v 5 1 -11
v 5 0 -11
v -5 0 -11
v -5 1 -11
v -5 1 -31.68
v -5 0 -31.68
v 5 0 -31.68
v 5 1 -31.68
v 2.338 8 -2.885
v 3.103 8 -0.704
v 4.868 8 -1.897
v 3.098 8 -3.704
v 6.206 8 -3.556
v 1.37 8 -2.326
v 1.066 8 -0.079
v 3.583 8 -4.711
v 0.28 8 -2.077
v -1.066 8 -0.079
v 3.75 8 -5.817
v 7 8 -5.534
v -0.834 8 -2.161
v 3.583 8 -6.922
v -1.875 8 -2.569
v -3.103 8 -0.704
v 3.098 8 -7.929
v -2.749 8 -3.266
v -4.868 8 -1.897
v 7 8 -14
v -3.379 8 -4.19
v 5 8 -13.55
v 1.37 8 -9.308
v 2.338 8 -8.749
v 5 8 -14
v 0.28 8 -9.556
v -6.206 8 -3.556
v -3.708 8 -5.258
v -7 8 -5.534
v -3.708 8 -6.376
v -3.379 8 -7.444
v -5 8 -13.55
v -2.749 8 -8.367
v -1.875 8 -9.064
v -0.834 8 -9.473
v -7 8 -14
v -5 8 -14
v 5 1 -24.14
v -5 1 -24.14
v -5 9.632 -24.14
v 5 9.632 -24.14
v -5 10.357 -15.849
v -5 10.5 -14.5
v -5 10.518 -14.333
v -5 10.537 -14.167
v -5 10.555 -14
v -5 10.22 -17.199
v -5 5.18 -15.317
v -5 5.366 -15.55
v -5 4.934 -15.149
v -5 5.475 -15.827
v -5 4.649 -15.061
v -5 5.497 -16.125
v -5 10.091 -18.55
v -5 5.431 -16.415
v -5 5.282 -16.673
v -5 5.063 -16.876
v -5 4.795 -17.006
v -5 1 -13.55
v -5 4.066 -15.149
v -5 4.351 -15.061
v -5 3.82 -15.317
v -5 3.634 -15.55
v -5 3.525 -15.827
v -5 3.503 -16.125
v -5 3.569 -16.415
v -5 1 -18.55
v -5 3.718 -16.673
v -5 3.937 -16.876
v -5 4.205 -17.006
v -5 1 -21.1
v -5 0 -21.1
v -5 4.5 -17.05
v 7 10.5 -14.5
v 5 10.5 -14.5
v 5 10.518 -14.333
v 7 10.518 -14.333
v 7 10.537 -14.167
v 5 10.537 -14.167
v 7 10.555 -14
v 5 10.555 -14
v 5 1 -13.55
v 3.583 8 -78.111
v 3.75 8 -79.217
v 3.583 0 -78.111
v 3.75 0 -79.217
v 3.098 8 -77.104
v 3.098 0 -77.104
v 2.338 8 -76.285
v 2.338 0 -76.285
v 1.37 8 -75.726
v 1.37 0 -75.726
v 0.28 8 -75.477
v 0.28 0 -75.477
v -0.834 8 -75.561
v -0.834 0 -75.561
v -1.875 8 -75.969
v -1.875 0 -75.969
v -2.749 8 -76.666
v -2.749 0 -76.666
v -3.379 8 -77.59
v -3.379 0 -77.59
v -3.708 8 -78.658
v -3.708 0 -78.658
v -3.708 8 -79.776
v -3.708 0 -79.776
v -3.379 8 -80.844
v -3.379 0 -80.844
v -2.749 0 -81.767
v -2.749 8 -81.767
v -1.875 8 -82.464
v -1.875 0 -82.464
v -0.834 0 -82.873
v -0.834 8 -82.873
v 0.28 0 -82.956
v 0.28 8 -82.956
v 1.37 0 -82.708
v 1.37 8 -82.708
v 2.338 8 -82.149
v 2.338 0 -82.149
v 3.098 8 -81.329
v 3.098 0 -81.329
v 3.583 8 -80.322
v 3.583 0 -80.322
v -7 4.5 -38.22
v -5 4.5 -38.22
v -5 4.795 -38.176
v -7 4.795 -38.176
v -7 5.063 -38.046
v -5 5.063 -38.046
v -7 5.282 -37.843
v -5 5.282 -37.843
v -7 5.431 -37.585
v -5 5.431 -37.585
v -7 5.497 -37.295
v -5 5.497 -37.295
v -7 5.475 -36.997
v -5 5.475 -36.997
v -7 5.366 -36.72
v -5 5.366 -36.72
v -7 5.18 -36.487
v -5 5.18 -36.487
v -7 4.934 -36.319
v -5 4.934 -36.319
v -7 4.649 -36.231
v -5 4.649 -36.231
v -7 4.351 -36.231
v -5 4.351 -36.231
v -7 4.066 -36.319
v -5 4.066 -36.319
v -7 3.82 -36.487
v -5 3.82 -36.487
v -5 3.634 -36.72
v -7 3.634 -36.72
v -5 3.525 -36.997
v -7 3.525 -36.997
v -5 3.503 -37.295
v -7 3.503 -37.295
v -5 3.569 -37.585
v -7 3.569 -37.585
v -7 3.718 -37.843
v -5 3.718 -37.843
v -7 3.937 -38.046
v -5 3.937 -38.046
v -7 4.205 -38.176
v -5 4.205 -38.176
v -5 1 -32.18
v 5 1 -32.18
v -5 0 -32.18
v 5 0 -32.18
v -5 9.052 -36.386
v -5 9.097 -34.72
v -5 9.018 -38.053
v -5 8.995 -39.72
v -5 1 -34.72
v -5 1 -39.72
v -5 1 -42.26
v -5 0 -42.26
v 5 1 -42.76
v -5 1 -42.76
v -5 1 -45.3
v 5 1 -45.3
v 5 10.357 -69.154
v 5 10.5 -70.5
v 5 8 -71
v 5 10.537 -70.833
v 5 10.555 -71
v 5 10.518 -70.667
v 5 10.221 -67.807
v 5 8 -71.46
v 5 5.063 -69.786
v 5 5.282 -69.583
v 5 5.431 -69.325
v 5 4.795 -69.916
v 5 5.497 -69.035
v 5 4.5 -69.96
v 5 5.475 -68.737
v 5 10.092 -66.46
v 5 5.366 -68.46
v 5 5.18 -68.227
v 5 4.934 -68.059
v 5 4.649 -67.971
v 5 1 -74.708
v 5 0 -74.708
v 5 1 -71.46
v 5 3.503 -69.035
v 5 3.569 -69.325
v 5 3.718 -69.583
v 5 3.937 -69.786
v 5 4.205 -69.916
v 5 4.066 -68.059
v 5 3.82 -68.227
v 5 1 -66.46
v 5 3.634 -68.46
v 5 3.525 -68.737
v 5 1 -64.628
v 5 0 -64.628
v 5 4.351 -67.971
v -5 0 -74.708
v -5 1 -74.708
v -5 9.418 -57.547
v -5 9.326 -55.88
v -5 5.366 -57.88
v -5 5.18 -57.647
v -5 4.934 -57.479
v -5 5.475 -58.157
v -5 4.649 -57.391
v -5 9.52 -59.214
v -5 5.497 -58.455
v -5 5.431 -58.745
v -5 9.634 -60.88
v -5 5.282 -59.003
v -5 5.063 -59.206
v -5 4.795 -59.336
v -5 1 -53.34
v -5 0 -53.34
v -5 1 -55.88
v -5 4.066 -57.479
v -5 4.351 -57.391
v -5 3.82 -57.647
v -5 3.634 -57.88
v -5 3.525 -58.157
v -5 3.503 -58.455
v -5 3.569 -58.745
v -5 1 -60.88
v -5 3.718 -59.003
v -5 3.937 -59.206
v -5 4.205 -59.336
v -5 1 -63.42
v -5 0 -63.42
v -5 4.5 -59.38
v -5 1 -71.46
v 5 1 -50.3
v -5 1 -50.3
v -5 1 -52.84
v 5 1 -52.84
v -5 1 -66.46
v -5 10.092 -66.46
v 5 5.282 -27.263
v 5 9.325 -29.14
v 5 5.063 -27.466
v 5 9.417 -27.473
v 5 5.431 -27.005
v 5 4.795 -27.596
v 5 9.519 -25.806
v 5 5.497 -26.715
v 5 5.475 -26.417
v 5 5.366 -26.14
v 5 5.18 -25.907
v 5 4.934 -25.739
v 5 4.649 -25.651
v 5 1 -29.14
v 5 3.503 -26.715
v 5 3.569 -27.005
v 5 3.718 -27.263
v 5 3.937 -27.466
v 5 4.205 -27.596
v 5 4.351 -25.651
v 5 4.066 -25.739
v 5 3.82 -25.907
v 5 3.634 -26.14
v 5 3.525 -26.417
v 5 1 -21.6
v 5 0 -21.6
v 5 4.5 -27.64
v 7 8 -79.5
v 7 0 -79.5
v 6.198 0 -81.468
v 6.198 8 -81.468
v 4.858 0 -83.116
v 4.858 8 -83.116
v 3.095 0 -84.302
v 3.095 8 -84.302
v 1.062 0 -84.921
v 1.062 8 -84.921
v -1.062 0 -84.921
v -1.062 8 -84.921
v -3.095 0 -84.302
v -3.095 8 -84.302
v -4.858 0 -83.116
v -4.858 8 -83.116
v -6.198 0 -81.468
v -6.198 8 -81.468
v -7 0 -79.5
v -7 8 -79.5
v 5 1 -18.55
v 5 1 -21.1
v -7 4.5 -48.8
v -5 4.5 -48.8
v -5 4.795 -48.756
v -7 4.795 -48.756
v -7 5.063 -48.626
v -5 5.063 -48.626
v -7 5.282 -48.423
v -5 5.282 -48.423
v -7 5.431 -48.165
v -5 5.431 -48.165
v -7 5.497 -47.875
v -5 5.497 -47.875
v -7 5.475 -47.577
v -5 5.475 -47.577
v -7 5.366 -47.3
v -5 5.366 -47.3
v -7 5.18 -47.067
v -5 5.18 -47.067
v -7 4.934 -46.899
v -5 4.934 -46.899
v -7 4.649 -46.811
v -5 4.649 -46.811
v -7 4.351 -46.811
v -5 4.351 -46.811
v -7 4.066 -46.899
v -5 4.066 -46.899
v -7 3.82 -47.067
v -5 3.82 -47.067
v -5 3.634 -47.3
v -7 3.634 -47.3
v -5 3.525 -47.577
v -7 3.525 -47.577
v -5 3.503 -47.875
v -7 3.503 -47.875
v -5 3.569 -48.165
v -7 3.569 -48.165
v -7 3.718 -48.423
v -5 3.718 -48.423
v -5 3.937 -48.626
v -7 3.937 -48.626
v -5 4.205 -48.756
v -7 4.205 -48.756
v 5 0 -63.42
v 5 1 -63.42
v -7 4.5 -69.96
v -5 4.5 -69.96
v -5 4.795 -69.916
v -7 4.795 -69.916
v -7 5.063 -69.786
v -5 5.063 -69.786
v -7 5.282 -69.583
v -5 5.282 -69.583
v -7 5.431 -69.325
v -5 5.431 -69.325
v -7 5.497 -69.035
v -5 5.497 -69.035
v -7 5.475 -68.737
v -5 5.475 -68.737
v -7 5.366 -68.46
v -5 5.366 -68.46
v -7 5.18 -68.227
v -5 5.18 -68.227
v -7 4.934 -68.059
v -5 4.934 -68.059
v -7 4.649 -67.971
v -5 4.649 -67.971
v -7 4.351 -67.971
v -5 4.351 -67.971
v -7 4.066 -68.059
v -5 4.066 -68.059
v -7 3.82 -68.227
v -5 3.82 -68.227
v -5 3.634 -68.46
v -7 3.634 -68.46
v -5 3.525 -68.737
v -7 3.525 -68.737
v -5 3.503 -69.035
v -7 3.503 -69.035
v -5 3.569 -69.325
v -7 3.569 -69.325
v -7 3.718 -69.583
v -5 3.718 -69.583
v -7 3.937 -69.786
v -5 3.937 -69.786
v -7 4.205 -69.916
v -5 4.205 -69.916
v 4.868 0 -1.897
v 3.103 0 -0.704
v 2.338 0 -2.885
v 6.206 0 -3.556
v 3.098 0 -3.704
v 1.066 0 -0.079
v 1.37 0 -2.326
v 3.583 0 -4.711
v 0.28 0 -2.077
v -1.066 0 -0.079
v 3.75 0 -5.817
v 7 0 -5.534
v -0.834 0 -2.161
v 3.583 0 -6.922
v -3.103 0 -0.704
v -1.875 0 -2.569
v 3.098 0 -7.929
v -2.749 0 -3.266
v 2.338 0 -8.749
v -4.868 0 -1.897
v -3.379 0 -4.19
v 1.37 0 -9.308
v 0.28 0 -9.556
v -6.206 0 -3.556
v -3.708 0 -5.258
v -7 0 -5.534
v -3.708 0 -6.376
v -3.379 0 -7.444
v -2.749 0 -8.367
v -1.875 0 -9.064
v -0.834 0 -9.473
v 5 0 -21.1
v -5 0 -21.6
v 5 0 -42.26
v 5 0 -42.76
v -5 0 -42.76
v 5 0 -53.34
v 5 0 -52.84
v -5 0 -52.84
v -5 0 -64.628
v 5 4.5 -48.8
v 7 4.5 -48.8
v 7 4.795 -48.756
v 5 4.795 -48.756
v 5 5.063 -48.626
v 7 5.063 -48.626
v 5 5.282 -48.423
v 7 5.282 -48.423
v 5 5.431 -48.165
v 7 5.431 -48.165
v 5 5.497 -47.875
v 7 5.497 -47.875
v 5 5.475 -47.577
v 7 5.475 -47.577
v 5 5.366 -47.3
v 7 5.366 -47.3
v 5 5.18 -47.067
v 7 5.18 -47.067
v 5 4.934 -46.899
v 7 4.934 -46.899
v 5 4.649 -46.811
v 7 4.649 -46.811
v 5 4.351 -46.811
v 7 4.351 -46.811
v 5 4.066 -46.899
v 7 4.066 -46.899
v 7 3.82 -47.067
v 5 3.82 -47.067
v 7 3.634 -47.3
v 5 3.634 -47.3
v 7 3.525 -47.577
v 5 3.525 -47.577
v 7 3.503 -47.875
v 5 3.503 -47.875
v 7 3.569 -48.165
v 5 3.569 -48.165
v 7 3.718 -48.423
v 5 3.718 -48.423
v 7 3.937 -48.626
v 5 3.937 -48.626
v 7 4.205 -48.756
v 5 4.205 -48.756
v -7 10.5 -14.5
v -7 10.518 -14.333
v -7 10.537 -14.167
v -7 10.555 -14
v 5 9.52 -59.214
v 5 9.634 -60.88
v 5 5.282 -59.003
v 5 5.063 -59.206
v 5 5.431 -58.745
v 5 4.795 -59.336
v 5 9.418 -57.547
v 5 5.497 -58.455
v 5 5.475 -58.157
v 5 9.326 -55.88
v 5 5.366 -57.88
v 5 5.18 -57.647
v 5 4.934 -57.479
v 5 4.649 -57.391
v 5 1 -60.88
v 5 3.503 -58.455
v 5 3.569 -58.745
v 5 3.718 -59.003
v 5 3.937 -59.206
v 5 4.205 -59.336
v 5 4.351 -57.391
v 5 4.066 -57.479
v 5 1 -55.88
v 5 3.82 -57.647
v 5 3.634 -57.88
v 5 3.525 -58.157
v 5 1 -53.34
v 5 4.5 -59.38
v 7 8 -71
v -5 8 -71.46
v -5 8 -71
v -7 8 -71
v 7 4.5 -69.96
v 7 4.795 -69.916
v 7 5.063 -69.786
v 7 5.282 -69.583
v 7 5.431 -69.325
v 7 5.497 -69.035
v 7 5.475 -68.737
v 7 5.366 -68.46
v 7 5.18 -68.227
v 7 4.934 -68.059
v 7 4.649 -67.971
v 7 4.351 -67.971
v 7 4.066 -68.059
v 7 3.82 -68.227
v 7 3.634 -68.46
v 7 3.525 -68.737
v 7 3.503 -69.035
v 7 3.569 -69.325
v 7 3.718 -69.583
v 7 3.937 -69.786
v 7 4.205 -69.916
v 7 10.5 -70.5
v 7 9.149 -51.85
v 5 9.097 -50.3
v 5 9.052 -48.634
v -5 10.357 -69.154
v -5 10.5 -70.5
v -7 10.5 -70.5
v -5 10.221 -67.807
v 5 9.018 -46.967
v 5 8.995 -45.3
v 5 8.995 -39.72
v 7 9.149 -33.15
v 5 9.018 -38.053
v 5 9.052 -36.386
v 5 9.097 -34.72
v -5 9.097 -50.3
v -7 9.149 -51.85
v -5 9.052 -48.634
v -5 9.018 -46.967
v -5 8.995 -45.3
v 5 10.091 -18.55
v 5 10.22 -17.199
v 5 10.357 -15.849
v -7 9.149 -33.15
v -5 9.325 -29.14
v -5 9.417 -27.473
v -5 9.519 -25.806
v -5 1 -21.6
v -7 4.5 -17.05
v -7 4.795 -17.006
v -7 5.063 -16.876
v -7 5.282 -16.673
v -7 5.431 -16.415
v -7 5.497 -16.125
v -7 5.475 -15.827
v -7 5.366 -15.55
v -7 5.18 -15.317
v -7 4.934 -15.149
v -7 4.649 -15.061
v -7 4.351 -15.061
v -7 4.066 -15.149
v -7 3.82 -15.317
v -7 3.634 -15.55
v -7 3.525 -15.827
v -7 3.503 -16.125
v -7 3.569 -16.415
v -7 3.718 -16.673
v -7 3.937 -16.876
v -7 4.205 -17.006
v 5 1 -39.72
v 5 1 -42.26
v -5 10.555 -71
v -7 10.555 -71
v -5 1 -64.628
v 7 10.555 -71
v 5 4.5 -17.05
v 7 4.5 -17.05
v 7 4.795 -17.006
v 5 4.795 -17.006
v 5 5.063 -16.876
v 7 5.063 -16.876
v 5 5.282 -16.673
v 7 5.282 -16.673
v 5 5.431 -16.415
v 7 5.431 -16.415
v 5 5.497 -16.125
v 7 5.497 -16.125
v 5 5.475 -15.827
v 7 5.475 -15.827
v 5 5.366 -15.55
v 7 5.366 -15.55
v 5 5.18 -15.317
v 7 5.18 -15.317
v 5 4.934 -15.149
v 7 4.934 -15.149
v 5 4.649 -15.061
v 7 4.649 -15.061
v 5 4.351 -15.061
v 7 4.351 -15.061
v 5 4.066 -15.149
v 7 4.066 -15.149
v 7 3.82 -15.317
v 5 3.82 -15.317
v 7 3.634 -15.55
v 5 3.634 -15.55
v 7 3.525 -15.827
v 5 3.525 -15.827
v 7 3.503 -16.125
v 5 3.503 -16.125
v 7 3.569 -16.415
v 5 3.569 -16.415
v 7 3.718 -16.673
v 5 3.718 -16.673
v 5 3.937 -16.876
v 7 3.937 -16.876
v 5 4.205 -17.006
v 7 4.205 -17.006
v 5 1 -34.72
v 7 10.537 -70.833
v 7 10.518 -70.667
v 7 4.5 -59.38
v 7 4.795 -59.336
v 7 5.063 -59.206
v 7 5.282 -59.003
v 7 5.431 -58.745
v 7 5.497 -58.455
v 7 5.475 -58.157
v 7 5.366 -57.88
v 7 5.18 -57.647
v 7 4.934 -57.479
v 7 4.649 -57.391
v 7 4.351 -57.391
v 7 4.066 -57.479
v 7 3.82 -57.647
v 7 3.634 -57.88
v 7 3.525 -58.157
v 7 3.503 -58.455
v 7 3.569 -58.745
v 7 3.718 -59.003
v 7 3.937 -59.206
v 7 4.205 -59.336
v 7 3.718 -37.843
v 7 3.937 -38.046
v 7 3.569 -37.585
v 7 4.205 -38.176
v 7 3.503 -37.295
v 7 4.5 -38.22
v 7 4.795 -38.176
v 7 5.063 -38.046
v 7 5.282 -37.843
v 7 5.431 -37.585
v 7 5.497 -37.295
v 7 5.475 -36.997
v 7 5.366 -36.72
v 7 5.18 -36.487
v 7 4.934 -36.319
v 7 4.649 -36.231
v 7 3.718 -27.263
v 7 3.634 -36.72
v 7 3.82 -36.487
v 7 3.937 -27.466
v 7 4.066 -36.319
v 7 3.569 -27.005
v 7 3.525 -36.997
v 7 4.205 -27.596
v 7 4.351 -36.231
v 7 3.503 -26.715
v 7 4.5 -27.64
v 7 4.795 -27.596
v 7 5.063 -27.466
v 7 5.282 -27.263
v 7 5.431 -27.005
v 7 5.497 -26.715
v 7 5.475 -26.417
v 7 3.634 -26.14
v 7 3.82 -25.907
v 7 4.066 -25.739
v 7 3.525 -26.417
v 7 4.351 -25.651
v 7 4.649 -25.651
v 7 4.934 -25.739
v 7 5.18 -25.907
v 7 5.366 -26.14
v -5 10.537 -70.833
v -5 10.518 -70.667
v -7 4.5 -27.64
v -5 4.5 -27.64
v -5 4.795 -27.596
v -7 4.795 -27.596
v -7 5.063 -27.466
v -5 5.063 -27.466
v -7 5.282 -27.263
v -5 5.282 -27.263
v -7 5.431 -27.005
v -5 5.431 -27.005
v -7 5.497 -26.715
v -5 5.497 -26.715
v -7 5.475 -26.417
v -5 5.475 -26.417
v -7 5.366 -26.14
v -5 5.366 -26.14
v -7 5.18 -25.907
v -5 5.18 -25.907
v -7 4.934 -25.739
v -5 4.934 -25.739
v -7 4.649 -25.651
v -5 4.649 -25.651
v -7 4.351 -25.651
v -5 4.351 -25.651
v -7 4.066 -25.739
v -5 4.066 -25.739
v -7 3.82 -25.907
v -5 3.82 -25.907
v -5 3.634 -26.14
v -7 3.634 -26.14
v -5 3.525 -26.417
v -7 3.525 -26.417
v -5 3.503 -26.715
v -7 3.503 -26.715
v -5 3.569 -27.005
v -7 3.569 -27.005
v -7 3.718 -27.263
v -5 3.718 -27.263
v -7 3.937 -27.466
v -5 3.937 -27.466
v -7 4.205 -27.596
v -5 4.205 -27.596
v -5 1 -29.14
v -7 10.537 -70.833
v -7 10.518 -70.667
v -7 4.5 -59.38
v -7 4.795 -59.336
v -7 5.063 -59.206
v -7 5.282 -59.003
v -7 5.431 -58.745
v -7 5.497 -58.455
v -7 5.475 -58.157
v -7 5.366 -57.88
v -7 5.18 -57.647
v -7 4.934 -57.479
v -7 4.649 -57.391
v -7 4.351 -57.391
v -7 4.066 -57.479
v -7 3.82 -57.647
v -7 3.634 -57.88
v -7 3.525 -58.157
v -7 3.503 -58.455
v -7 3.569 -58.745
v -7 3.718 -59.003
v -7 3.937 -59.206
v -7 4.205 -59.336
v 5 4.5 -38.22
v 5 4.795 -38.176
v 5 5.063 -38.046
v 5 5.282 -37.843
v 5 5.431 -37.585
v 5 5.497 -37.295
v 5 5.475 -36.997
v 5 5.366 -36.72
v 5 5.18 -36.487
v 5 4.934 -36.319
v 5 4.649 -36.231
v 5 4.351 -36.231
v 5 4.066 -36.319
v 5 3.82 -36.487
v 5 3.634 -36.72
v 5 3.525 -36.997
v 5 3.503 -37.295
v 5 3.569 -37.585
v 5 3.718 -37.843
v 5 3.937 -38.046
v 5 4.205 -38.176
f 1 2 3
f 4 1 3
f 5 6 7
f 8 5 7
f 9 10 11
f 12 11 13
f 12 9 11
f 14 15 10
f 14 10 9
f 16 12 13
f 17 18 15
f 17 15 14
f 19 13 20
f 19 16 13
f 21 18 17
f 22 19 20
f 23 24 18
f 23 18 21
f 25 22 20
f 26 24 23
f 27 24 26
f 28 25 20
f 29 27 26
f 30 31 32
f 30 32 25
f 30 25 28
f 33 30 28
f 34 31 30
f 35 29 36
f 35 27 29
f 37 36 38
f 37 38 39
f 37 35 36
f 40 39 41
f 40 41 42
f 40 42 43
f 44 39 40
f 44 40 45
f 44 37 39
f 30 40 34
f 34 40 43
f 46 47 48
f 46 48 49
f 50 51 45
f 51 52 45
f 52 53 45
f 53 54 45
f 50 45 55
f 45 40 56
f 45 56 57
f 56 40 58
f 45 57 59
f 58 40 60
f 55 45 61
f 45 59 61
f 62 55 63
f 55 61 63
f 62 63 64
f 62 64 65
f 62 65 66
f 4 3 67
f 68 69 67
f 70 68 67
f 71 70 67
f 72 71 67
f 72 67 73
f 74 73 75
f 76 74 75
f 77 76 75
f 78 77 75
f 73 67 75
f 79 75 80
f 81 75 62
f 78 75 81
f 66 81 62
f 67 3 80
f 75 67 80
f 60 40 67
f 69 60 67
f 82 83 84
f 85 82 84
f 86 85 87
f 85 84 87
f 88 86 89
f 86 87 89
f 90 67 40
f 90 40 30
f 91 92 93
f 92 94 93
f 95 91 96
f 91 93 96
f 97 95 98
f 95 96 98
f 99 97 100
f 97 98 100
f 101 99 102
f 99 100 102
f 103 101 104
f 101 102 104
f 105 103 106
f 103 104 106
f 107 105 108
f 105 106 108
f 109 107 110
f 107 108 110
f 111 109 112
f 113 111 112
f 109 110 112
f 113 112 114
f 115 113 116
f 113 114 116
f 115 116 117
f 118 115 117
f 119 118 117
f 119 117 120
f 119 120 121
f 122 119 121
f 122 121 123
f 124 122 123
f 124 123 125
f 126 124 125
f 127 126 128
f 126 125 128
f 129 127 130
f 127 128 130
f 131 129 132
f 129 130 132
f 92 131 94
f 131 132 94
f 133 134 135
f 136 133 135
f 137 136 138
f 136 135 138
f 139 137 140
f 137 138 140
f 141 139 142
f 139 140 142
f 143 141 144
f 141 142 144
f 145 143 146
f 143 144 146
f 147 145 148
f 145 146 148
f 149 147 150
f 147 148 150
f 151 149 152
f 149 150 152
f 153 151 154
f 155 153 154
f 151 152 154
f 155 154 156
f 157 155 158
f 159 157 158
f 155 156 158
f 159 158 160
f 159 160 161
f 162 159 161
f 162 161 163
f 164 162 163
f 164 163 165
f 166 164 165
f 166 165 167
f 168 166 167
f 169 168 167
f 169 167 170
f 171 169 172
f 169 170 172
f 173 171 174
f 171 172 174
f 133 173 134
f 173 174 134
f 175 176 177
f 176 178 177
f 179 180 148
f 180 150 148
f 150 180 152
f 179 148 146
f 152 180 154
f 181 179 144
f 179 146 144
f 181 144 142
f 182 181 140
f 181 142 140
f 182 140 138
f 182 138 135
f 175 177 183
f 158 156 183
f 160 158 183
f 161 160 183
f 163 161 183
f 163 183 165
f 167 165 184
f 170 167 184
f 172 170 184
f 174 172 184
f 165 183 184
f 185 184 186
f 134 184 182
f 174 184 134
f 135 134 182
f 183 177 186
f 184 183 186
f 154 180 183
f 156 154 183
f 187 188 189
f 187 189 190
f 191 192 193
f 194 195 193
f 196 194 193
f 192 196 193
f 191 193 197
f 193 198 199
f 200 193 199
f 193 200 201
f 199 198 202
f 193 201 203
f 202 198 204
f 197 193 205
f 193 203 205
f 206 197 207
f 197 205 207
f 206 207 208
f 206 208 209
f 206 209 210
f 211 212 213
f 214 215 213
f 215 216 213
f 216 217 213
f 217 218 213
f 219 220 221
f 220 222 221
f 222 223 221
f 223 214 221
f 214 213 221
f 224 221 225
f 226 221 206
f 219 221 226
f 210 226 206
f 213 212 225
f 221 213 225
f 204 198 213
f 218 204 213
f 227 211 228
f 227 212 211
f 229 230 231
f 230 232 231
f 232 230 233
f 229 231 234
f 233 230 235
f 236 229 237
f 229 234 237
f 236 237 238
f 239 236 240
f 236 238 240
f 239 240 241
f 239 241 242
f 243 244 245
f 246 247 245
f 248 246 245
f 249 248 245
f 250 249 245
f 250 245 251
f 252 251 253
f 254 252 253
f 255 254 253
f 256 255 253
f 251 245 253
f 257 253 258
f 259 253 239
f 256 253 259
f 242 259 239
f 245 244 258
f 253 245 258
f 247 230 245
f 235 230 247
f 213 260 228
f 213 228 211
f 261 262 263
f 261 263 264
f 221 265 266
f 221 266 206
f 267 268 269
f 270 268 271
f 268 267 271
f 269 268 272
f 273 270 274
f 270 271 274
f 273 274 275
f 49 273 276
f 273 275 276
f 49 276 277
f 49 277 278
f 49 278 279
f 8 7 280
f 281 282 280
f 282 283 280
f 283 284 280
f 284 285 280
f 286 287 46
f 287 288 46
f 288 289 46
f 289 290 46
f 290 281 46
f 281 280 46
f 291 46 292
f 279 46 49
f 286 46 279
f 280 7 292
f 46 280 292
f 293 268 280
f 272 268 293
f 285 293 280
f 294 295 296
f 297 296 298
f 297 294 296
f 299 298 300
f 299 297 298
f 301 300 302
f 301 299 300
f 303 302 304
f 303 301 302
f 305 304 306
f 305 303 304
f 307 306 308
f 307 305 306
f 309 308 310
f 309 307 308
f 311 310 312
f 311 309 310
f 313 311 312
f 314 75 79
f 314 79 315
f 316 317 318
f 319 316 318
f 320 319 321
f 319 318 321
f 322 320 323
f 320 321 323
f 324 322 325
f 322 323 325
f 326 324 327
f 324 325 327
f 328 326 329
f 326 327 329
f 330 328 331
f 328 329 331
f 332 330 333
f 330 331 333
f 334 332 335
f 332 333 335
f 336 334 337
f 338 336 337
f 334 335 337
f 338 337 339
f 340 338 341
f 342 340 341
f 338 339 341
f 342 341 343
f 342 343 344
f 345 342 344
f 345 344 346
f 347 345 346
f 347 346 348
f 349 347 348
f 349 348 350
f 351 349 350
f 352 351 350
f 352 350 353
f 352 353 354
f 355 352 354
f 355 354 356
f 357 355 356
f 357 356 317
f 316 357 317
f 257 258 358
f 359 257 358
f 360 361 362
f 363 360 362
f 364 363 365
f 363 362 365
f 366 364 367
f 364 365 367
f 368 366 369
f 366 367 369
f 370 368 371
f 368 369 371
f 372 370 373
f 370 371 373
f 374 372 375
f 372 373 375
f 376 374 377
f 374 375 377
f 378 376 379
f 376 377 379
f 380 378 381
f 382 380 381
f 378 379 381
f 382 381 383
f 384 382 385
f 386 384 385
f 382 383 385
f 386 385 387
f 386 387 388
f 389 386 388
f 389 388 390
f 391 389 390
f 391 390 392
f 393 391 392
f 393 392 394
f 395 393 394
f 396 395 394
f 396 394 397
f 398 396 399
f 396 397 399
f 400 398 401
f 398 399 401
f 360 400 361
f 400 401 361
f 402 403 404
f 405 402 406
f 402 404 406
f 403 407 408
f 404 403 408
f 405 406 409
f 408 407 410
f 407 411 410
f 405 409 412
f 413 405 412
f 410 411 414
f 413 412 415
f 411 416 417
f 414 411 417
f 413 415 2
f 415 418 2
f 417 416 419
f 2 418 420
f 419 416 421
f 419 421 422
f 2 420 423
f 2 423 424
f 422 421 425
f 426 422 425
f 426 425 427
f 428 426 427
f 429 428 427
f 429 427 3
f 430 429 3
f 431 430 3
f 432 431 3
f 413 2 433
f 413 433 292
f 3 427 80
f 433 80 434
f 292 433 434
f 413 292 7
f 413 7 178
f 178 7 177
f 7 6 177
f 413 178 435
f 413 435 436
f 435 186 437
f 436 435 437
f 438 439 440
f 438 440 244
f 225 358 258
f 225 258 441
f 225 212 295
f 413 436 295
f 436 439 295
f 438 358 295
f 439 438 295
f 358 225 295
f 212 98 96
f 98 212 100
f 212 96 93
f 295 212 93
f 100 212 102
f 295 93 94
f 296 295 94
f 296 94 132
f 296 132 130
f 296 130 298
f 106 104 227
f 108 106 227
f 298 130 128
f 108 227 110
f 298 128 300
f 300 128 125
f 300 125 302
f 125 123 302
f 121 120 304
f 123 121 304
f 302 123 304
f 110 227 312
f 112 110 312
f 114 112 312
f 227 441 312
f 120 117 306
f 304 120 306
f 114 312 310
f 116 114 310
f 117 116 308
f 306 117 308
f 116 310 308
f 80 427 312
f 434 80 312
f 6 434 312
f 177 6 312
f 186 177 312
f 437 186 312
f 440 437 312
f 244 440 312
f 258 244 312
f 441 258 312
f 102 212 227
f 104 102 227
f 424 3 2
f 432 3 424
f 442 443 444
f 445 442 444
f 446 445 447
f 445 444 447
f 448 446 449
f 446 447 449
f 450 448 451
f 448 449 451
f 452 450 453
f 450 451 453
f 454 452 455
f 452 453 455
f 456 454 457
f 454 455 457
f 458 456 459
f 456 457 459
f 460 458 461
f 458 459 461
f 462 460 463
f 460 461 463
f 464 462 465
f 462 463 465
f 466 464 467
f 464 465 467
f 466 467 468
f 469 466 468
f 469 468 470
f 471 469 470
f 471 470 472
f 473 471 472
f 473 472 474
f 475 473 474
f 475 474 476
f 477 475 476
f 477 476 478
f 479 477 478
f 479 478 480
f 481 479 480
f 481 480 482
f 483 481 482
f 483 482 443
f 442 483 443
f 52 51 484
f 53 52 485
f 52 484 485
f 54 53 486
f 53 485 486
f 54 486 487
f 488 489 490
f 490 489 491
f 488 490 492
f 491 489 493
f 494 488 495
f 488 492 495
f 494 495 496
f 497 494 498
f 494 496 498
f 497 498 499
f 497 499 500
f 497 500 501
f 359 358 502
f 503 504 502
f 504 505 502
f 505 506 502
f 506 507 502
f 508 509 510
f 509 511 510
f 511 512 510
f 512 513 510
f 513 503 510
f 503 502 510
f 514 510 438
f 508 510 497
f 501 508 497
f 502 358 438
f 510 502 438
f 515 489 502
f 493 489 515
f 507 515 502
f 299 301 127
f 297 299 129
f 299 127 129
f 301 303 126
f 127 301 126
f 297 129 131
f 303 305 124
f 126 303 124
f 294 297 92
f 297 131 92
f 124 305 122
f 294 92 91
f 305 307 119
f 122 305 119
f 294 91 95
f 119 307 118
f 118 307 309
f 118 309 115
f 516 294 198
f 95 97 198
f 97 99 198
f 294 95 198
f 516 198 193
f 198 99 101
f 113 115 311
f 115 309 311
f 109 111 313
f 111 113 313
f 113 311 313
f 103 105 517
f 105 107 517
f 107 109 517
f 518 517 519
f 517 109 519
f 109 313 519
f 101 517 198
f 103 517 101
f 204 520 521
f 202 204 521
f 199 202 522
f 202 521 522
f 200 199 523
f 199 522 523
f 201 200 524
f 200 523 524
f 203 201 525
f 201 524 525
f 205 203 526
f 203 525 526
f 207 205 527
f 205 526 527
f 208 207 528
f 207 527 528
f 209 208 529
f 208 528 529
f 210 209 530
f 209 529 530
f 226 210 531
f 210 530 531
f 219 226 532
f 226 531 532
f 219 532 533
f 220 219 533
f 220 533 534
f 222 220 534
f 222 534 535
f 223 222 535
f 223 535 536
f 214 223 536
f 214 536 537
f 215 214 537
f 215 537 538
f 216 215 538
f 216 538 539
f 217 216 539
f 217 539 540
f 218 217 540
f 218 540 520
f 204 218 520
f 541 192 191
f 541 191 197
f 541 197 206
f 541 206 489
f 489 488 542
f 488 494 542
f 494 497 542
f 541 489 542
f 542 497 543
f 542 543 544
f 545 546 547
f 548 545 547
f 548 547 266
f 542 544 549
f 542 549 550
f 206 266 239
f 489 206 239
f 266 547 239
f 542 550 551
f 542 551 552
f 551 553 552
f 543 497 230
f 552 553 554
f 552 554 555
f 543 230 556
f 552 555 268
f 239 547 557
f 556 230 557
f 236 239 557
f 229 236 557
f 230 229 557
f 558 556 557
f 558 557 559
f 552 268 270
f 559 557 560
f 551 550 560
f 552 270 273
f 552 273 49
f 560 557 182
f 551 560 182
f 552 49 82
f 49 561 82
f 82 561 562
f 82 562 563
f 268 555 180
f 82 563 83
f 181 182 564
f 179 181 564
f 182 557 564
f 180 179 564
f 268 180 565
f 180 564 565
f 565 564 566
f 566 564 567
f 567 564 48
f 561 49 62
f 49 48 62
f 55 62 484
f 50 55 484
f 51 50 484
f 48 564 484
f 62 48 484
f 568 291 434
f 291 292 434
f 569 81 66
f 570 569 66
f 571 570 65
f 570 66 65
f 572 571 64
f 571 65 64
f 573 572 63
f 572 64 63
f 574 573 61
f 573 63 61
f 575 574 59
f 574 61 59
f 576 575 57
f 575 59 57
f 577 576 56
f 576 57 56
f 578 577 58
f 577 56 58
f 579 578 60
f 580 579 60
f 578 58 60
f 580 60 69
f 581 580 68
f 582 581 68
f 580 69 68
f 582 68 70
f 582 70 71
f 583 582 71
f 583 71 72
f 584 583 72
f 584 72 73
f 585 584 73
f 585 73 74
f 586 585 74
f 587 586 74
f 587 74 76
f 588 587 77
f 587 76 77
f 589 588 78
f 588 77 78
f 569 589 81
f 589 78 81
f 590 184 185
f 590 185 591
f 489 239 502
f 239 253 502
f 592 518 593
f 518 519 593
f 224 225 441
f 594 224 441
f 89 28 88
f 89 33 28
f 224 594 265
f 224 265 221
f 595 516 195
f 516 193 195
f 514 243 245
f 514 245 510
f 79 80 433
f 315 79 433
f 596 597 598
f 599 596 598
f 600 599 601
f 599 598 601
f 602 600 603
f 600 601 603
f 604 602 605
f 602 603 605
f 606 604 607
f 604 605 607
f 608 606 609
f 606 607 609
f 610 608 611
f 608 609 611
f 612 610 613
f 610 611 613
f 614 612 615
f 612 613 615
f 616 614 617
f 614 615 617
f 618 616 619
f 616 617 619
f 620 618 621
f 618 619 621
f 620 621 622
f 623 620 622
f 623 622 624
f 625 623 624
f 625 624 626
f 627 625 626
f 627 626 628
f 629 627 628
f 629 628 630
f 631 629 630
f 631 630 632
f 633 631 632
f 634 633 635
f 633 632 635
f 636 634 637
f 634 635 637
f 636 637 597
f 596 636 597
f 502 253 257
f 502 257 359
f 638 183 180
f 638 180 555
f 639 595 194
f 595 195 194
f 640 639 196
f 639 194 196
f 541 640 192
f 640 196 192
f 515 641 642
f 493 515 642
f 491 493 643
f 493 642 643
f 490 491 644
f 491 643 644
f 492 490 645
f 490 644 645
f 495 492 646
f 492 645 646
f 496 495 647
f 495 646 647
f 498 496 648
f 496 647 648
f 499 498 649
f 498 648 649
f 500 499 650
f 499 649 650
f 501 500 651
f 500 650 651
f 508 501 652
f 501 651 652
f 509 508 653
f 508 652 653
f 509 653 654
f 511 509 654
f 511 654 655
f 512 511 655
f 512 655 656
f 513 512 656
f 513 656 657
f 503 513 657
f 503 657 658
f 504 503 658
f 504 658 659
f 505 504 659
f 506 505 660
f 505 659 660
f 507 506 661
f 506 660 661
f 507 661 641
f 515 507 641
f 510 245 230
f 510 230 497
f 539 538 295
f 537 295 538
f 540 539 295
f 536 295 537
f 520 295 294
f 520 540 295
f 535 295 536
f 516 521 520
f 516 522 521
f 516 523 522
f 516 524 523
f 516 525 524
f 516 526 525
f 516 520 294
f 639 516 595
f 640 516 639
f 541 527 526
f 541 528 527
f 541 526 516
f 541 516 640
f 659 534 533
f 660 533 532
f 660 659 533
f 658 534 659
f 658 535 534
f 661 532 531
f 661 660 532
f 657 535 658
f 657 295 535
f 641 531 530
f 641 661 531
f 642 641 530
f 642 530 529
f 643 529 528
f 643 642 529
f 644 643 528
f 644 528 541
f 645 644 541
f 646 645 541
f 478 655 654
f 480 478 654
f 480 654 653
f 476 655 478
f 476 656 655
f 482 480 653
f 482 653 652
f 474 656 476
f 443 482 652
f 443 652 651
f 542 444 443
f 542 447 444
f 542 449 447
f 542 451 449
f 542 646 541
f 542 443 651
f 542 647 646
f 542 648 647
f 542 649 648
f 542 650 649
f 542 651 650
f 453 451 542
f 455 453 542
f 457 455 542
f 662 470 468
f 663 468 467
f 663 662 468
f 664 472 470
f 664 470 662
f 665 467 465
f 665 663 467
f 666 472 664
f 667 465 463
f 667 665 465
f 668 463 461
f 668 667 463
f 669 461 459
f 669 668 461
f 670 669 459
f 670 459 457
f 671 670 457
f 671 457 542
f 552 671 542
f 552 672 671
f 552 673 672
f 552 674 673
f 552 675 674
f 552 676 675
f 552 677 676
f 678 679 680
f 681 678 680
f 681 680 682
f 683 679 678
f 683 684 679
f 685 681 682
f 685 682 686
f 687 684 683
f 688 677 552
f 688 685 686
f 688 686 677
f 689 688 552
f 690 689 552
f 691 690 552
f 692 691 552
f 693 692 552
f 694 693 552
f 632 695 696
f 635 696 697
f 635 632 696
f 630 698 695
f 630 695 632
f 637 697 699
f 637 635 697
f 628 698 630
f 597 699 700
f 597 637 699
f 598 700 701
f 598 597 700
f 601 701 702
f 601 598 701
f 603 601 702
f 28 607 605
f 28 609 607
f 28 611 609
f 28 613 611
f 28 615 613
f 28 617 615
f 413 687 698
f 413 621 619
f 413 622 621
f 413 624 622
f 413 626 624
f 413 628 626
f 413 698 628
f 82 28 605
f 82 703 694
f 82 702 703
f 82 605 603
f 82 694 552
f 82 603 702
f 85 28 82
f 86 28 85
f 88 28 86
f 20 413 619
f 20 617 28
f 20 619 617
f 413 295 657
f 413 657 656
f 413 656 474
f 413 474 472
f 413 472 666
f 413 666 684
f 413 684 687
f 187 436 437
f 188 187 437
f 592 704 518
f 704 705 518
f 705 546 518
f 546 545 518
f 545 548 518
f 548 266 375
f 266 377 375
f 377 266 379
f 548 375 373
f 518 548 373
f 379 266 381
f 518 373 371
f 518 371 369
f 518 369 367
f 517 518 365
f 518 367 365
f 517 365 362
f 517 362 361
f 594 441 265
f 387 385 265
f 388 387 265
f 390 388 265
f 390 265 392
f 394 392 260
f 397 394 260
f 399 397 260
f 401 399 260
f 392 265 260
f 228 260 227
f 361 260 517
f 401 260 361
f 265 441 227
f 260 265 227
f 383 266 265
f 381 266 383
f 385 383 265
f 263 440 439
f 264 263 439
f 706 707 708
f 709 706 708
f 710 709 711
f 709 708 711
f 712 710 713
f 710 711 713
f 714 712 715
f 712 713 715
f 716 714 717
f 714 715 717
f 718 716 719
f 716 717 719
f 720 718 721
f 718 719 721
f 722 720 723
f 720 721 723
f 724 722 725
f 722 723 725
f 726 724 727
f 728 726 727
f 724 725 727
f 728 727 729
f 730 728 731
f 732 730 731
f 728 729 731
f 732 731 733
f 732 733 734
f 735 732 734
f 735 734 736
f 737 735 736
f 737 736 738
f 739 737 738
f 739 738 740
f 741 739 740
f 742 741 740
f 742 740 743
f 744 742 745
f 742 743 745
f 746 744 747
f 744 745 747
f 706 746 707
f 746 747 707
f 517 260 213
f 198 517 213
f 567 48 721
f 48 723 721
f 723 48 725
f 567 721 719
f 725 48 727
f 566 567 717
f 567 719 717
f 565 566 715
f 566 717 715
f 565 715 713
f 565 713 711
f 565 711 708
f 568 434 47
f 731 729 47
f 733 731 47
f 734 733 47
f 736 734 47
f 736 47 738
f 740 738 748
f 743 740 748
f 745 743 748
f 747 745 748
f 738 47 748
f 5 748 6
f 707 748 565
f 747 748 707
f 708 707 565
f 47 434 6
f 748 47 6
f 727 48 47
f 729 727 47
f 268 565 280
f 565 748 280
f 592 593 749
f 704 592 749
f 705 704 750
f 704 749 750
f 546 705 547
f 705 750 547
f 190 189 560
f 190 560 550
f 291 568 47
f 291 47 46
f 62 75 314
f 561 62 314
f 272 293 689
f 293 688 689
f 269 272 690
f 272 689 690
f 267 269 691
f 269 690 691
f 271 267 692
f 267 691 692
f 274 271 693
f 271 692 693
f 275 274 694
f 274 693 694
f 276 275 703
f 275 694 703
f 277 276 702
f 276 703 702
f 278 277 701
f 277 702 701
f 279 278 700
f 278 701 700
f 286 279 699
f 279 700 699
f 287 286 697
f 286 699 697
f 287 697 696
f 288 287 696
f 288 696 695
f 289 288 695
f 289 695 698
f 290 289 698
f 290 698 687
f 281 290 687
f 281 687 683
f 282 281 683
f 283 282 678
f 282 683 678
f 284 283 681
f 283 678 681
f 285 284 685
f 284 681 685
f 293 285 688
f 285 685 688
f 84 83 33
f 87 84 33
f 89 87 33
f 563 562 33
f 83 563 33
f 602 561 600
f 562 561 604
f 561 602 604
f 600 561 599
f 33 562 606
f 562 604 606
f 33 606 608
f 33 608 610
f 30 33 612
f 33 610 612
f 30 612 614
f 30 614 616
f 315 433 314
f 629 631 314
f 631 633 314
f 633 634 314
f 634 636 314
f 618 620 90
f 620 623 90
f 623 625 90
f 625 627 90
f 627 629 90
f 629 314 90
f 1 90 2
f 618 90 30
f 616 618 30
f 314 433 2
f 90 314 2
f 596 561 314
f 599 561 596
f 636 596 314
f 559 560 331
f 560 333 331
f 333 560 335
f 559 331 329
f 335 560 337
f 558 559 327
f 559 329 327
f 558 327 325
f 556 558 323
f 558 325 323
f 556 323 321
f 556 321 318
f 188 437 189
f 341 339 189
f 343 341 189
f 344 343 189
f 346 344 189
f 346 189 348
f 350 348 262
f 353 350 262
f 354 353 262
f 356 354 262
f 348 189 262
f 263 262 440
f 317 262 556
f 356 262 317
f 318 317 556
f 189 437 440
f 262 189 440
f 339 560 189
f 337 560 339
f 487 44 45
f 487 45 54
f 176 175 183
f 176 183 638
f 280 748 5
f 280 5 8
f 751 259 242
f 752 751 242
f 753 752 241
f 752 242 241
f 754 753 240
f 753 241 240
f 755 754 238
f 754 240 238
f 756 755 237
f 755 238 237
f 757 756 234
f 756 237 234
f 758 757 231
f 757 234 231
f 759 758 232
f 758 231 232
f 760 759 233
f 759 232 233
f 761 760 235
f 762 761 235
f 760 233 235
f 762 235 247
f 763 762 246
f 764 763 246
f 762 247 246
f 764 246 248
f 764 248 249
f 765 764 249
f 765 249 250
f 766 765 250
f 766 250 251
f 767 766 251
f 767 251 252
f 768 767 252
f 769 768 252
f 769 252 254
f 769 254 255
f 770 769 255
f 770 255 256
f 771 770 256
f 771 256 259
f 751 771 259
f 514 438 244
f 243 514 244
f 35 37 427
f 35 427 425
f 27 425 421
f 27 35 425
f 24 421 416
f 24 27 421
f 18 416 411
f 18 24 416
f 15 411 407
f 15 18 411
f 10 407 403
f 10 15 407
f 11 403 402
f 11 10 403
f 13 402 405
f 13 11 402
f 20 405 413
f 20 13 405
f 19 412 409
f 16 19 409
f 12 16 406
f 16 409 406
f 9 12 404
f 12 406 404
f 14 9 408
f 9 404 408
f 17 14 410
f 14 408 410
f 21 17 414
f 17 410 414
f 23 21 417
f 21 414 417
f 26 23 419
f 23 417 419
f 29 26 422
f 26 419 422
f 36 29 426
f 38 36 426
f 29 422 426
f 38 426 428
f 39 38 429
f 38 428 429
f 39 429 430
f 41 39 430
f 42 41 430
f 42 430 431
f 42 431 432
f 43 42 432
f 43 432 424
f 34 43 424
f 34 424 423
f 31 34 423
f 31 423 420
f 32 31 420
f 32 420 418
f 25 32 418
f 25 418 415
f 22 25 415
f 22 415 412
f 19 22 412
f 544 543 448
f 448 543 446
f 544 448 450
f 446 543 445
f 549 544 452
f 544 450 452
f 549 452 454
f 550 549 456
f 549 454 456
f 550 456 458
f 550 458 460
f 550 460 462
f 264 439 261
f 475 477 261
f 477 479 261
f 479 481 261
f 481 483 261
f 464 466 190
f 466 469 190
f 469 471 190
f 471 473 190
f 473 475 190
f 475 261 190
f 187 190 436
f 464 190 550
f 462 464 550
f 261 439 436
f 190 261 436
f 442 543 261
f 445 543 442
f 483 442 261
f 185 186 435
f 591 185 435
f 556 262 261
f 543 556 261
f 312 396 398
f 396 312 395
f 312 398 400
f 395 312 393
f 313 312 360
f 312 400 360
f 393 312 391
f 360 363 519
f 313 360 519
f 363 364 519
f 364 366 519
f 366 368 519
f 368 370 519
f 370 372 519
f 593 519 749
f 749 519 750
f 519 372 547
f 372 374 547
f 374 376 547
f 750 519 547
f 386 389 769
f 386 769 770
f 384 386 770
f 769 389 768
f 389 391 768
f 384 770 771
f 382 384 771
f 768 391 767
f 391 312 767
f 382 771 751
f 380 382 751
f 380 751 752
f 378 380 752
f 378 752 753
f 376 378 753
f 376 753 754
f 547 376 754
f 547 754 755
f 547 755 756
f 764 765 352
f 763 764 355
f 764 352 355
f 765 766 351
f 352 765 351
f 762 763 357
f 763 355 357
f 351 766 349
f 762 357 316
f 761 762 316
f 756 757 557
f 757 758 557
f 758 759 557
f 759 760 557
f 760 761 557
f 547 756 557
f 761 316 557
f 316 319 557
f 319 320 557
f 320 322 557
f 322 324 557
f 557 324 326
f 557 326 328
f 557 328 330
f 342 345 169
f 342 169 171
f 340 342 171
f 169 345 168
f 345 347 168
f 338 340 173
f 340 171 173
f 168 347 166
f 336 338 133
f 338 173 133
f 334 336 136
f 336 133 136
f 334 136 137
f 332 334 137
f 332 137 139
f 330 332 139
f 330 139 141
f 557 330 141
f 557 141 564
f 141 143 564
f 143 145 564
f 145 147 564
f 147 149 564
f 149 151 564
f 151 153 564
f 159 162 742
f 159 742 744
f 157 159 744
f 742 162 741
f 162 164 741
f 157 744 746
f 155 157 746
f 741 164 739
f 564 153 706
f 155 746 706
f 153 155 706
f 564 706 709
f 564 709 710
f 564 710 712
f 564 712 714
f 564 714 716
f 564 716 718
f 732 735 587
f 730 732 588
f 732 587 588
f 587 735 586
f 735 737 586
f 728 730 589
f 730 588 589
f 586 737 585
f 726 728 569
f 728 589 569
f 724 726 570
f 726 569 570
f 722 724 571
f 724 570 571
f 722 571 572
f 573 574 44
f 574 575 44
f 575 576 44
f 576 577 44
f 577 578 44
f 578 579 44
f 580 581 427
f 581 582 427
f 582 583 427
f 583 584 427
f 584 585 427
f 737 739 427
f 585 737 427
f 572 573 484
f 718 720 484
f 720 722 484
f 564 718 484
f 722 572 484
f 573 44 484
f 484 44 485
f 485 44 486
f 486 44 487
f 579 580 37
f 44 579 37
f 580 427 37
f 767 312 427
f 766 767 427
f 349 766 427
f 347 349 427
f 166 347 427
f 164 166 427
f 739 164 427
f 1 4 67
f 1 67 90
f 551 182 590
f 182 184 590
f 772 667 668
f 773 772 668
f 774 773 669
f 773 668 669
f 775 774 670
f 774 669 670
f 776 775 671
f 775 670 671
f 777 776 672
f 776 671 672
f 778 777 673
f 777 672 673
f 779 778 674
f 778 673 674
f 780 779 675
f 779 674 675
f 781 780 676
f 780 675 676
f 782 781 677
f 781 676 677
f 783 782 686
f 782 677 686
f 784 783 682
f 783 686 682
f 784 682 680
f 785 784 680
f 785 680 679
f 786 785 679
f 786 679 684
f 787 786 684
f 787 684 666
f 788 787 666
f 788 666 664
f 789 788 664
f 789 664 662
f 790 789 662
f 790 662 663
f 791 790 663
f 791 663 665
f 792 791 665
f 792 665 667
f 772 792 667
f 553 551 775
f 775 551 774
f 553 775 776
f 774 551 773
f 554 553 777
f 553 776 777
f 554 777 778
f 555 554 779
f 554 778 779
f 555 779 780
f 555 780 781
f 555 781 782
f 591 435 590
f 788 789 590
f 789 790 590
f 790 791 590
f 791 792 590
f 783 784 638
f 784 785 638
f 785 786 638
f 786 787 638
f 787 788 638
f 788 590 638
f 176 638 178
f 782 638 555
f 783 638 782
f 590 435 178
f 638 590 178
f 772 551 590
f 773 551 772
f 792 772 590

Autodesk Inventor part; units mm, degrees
ref_plane "YZ Plane" through (0, 0, 0) normal (1, 0, 0) x (0, 1, 0)
ref_plane "XY Plane" through (0, 0, 0) normal (0, 0, 1) x (1, 0, 0)
sketch "Sketch1" plane through (0, 0, 0) normal (1, 0, 0) x (0, 1, 0)
  line L0 (0, 0) -> (0, -85)
  line L1 (0, -85) -> (8, -85)
  line L2 (0, 0) -> (8, 0)
  line L3 (8, 0) -> (8, -14)
  line L4 (8, -85) -> (8, -71)
  line L5 (8, -14) -> (9, -14)
  line L6 (8, -71) -> (9, -71)
  arc A0 (10.5, -14.5) -> (10.5, -70.5) centre (267.5593, -42.5) ccw
  line L7 (8, -71) -> (10.555, -71)
  line L8 (8, -14) -> (10.555, -14)
  arc A1 (10.555, -14) -> (10.555, -71) centre (267.5473, -42.5) ccw
extrude "Extrusion1" add sketch "Sketch1" along normal mid plane 14
sketch "Sketch2" plane through (-7, 8, 0) normal (0, 1, 0) x (1, 0, 0)
  line L0 (0, 85) -> (0, 0) projected
  line L1 (0, 14.0338) -> (0, 5.5338)
  line L2 (14, 0) -> (14, 85) projected
  line L3 (14, 14.0338) -> (14, 5.5338)
  arc A0 (0, 5.5338) -> (14, 5.5338) centre (7, 7.1942) ccw
  line L4 (0, 5.5338) -> (0, 0)
  line L5 (0, 0) -> (14, 0) projected
  line L6 (14, 0) -> (14, 5.5338)
  point P0 (7, 0)
  dimension "d13" = 8.5
extrude "Extrusion2" cut sketch "Sketch2" against normal blind 14
sketch "Sketch3" plane through (-7, 8, -71) normal (0, 1, 0) x (1, 0, 0)
  line L0 (0, 0) -> (14, 0) projected
  line L1 (0, 0) -> (0, 14) projected
  arc A0 (14, 8.5) -> (0, 8.5) centre (7, 6.7955) ccw
  line L2 (0, 8.5) -> (0, 14)
  line L3 (0, 14) -> (14, 14) projected
  line L4 (14, 14) -> (14, 8.5)
  line L5 (14, -65.4662) -> (14, 14) projected
  line L6 (0, 14) -> (0, 8.5)
  line L7 (14, 8.5) -> (14, 14)
  line L8 (14, 14) -> (0, 14)
  line L9 (0, 8.5) -> (0, 14)
  line L10 (0, 14) -> (14, 14) projected
  line L11 (14, 14) -> (14, 8.5)
  line L12 (14, 14) -> (14, 0) projected
  arc A1 (14, 8.5) -> (0, 8.5) centre (7, 6.7955) ccw
  point P0 (7, -71)
extrude "Extrusion3" cut sketch "Sketch3" against normal blind 14 contours L1 L3 A0 | A0 L3 L4
sketch "Sketch7" plane through (0, 0, -7.1942) normal (0, -1, 0) x (1, 0, 0)
  circle A0 centre (0, 2.1942) radius 3 projected
  line L0 (0, -0.8058) -> (0, -3.8058)
  circle A1 centre (0, -72.0142) radius 1.5 projected
  line L1 (0, -70.5142) -> (0, -67.5142)
  line L2 (0, -67.5142) -> (-5, -67.5142)
  line L3 (-5, -67.5142) -> (5, -67.5142)
  line L4 (-5, -67.5142) -> (5, -67.5142)
  line L5 (5, -67.5142) -> (5, -57.4342)
  line L6 (5, -57.4342) -> (-5, -57.4342)
  line L7 (-5, -57.4342) -> (-5, -67.5142)
  line L8 (0, -57.4342) -> (0, -56.9342)
  line L9 (-5, -56.2258) -> (5, -56.2258)
  line L10 (5, -56.2258) -> (5, -46.1458)
  line L11 (5, -46.1458) -> (-5, -46.1458)
  line L12 (-5, -46.1458) -> (-5, -56.2258)
  line L13 (0, -46.1458) -> (0, -45.6458)
  line L14 (-5, -45.6458) -> (5, -45.6458)
  line L15 (5, -45.6458) -> (5, -35.5658)
  line L16 (5, -35.5658) -> (-5, -35.5658)
  line L17 (-5, -35.5658) -> (-5, -45.6458)
  line L18 (0, -35.5658) -> (0, -35.0658)
  line L19 (-5, -35.0658) -> (5, -35.0658)
  line L20 (5, -35.0658) -> (5, -24.9858)
  line L21 (5, -24.9858) -> (-5, -24.9858)
  line L22 (-5, -24.9858) -> (-5, -35.0658)
  line L23 (0, -24.9858) -> (0, -24.4858)
  line L24 (-5, -24.4858) -> (5, -24.4858)
  line L25 (5, -24.4858) -> (5, -14.4058)
  line L26 (5, -14.4058) -> (-5, -14.4058)
  line L27 (-5, -14.4058) -> (-5, -24.4858)
  line L28 (0, -14.4058) -> (0, -13.9058)
  line L29 (-5, -13.9058) -> (5, -13.9058)
  line L30 (5, -13.9058) -> (5, -3.8058)
  line L31 (5, -3.8058) -> (-5, -3.8058)
  line L32 (-5, -3.8058) -> (-5, -13.9058)
  point P0 (0, 7.1942)
extrude "Extrusion6" cut sketch "Sketch7" against normal blind 1 contours L31 L30 L29 L32 | L2 L7 L6 L5 L3
sketch "Sketch8" plane through (0, 0, -7.1942) normal (0, -1, 0) x (1, 0, 0)
  line L0 (-5, -57.4342) -> (5, -57.4342) projected
  line L1 (0, -57.4342) -> (0, -56.9342)
  line L2 (-5, -56.2258) -> (5, -56.2258)
  line L3 (5, -56.2258) -> (5, -46.1458)
  line L4 (5, -46.1458) -> (-5, -46.1458)
  line L5 (-5, -46.1458) -> (-5, -56.2258)
  line L6 (0, -46.1458) -> (0, -45.6458)
  line L7 (-5, -45.6458) -> (5, -45.6458)
  line L8 (5, -45.6458) -> (5, -35.5658)
  line L9 (5, -35.5658) -> (-5, -35.5658)
  line L10 (-5, -35.5658) -> (-5, -45.6458)
  line L11 (0, -35.5658) -> (0, -35.0658)
  line L12 (-5, -35.0658) -> (5, -35.0658)
  line L13 (5, -35.0658) -> (5, -24.9858)
  line L14 (5, -24.9858) -> (-5, -24.9858)
  line L15 (-5, -24.9858) -> (-5, -35.0658)
  line L16 (0, -24.9858) -> (0, -24.4858)
  line L17 (-5, -24.4858) -> (5, -24.4858)
  line L18 (5, -24.4858) -> (5, -14.4058)
  line L19 (5, -14.4058) -> (-5, -14.4058)
  line L20 (-5, -14.4058) -> (-5, -24.4858)
  point P0 (0, 7.1942)
  dimension "d75" = 0.5
  dimension "d76" = 10.08
  dimension "d77" = 0.5
  dimension "d78" = 10.08
  dimension "d79" = 0.5
  dimension "d80" = 10.08
  dimension "d81" = 0.5
  dimension "d82" = 10.08
extrude "Extrusion7" cut sketch "Sketch8" against normal blind 1
sketch "Sketch9" plane through (0, 1, -7.1942) normal (0, -1, 0) x (1, 0, 0)
  line L0 (-5, -67.5142) -> (-5, -57.4342) projected
  line L1 (5, -57.4342) -> (5, -67.5142) projected
  line L2 (-5, -59.2658) -> (5, -59.2658)
  line L3 (-5, -64.2658) -> (5, -64.2658)
  line L4 (-5, -64.2658) -> (-5, -59.2658)
  line L5 (5, -64.2658) -> (5, -59.2658)
  line L6 (5, -64.2658) -> (5, -59.2658)
  point P0 (0, 7.1942)
extrude "Extrusion8" cut sketch "Sketch9" against normal blind 20
sketch "Sketch10" plane through (0, 1, -7.1942) normal (0, -1, 0) x (1, 0, 0)
  line L0 (-5, -56.2258) -> (-5, -46.1458) projected
  line L1 (5, -46.1458) -> (5, -56.2258) projected
  line L2 (-5, -53.6858) -> (5, -53.6858)
  line L3 (-5, -48.6858) -> (5, -48.6858)
  line L4 (5, -48.6858) -> (5, -53.6858)
  line L5 (-5, -48.6858) -> (-5, -53.6858)
  point P0 (0, 7.1942)
  dimension "d109" = 5
extrude "Extrusion9" cut sketch "Sketch10" against normal blind 20
sketch "Sketch11" plane through (0, 1, -7.1942) normal (0, -1, 0) x (1, 0, 0)
  line L0 (-5, -45.6458) -> (-5, -35.5658) projected
  line L1 (5, -35.5658) -> (5, -45.6458) projected
  line L2 (-5, -43.1058) -> (5, -43.1058)
  line L3 (-5, -38.1058) -> (5, -38.1058)
  line L4 (5, -38.1058) -> (5, -43.1058)
  line L5 (-5, -38.1058) -> (-5, -43.1058)
  point P0 (0, 7.1942)
extrude "Extrusion10" cut sketch "Sketch11" against normal blind 20
sketch "Sketch12" plane through (0, 1, -7.1942) normal (0, -1, 0) x (1, 0, 0)
  line L0 (-5, -35.0658) -> (-5, -24.9858) projected
  line L1 (5, -24.9858) -> (5, -35.0658) projected
  line L2 (-5, -32.5258) -> (5, -32.5258)
  line L3 (-5, -27.5258) -> (5, -27.5258)
  line L4 (5, -27.5258) -> (5, -32.5258)
  line L5 (-5, -27.5258) -> (-5, -32.5258)
  point P0 (0, 7.1942)
extrude "Extrusion11" cut sketch "Sketch12" against normal blind 20
sketch "Sketch13" plane through (0, 1, -7.1942) normal (0, -1, 0) x (1, 0, 0)
  line L0 (-5, -24.4858) -> (-5, -14.4058) projected
  line L1 (-5, -21.9458) -> (5, -21.9458)
  line L2 (-5, -16.9458) -> (5, -16.9458)
  line L3 (5, -16.9458) -> (5, -21.9458)
  line L4 (5, -14.4058) -> (5, -24.4858) projected
  line L5 (-5, -16.9458) -> (-5, -21.9458)
  point P0 (0, 7.1942)
extrude "Extrusion12" cut sketch "Sketch13" against normal blind 20
sketch "Sketch14" plane through (0, 1, -7.1942) normal (0, -1, 0) x (1, 0, 0)
  line L0 (-5, -13.9058) -> (-5, -3.8058) projected
  line L1 (5, -3.8058) -> (5, -13.9058) projected
  line L2 (-5, -11.3558) -> (5, -11.3558)
  line L3 (-5, -6.3558) -> (5, -6.3558)
  line L4 (5, -6.3558) -> (5, -11.3558)
  line L5 (-5, -6.772) -> (-5, -11.3558)
  line L6 (-5, -6.3558) -> (-5, -11.3558)
  point P0 (0, 7.1942)
extrude "Extrusion13" cut sketch "Sketch14" against normal blind 20
ref_plane "Work Plane1" through (0, 8.9795, -42.5) normal (0, 1, 0) x (-1, 0, 0)
sketch "Sketch30" plane through (0, 0, -7.1942) normal (0, -1, 0) x (1, 0, 0)
  line L0 (7, 1.6605) -> (7, -72.3058) construction
  line L1 (7, -35.3226) -> (-7, -35.3226) construction
  line L2 (-7, -72.3058) -> (-7, 1.6605) construction
  line L3 (0, -35.3226) -> (0, 1.3774) construction
  line L4 (0, -35.3226) -> (0, -72.0226) construction
  circle A0 centre (0, 1.3774) radius 3.75
  circle A1 centre (0, -72.0226) radius 3.75
  point P0 (0, 7.1942)
  dimension "d140" = 36.7
  dimension "d141" = 36.7
  dimension "d142" = 7.5
  dimension "d143" = 7.5
extrude "Extrusion16" cut sketch "Sketch30" against normal through all
sketch "Sketch31" plane through (7, 0, 0) normal (1, 0, 0) x (0, 0, -1)
  line L0 (13.55, 1) -> (13.55, 8) construction
  line L1 (71.46, 1) -> (71.46, 8) construction
  line L2 (18.55, 1) -> (18.55, 10.0911) construction
  line L3 (24.14, 1) -> (24.14, 9.6322) construction
  line L4 (29.14, 1) -> (29.14, 9.3249) construction
  line L5 (34.72, 1) -> (34.72, 9.0966) construction
  line L6 (39.72, 1) -> (39.72, 8.9945) construction
  line L7 (45.3, 1) -> (45.3, 8.9947) construction
  line L8 (50.3, 1) -> (50.3, 9.0972) construction
  line L9 (55.88, 1) -> (55.88, 9.326) construction
  line L10 (60.88, 1) -> (60.88, 9.6336) construction
  line L11 (66.46, 1) -> (66.46, 10.0921) construction
  line L12 (13.55, 4.5) -> (18.55, 4.5) construction
  line L13 (24.14, 4.5) -> (29.14, 4.5) construction
  line L14 (34.72, 4.5) -> (39.72, 4.5) construction
  line L15 (45.3, 4.5) -> (50.3, 4.5) construction
  line L16 (55.88, 4.5) -> (60.88, 4.5) construction
  line L17 (66.46, 4.5) -> (71.46, 4.5) construction
  circle A0 centre (16.05, 4.5) radius 1
  circle A1 centre (26.64, 4.5) radius 1
  circle A2 centre (37.22, 4.5) radius 1
  circle A3 centre (47.8, 4.5) radius 1
  circle A4 centre (58.38, 4.5) radius 1
  circle A5 centre (68.96, 4.5) radius 1
  point P0 (0, 0)
  dimension "d146" = 2
  dimension "d147" = 2
  dimension "d148" = 2
  dimension "d149" = 2
  dimension "d150" = 2
  dimension "d151" = 2
extrude "Extrusion17" cut sketch "Sketch31" against normal through all
properties part number "Ponte menor" material "Steel"
